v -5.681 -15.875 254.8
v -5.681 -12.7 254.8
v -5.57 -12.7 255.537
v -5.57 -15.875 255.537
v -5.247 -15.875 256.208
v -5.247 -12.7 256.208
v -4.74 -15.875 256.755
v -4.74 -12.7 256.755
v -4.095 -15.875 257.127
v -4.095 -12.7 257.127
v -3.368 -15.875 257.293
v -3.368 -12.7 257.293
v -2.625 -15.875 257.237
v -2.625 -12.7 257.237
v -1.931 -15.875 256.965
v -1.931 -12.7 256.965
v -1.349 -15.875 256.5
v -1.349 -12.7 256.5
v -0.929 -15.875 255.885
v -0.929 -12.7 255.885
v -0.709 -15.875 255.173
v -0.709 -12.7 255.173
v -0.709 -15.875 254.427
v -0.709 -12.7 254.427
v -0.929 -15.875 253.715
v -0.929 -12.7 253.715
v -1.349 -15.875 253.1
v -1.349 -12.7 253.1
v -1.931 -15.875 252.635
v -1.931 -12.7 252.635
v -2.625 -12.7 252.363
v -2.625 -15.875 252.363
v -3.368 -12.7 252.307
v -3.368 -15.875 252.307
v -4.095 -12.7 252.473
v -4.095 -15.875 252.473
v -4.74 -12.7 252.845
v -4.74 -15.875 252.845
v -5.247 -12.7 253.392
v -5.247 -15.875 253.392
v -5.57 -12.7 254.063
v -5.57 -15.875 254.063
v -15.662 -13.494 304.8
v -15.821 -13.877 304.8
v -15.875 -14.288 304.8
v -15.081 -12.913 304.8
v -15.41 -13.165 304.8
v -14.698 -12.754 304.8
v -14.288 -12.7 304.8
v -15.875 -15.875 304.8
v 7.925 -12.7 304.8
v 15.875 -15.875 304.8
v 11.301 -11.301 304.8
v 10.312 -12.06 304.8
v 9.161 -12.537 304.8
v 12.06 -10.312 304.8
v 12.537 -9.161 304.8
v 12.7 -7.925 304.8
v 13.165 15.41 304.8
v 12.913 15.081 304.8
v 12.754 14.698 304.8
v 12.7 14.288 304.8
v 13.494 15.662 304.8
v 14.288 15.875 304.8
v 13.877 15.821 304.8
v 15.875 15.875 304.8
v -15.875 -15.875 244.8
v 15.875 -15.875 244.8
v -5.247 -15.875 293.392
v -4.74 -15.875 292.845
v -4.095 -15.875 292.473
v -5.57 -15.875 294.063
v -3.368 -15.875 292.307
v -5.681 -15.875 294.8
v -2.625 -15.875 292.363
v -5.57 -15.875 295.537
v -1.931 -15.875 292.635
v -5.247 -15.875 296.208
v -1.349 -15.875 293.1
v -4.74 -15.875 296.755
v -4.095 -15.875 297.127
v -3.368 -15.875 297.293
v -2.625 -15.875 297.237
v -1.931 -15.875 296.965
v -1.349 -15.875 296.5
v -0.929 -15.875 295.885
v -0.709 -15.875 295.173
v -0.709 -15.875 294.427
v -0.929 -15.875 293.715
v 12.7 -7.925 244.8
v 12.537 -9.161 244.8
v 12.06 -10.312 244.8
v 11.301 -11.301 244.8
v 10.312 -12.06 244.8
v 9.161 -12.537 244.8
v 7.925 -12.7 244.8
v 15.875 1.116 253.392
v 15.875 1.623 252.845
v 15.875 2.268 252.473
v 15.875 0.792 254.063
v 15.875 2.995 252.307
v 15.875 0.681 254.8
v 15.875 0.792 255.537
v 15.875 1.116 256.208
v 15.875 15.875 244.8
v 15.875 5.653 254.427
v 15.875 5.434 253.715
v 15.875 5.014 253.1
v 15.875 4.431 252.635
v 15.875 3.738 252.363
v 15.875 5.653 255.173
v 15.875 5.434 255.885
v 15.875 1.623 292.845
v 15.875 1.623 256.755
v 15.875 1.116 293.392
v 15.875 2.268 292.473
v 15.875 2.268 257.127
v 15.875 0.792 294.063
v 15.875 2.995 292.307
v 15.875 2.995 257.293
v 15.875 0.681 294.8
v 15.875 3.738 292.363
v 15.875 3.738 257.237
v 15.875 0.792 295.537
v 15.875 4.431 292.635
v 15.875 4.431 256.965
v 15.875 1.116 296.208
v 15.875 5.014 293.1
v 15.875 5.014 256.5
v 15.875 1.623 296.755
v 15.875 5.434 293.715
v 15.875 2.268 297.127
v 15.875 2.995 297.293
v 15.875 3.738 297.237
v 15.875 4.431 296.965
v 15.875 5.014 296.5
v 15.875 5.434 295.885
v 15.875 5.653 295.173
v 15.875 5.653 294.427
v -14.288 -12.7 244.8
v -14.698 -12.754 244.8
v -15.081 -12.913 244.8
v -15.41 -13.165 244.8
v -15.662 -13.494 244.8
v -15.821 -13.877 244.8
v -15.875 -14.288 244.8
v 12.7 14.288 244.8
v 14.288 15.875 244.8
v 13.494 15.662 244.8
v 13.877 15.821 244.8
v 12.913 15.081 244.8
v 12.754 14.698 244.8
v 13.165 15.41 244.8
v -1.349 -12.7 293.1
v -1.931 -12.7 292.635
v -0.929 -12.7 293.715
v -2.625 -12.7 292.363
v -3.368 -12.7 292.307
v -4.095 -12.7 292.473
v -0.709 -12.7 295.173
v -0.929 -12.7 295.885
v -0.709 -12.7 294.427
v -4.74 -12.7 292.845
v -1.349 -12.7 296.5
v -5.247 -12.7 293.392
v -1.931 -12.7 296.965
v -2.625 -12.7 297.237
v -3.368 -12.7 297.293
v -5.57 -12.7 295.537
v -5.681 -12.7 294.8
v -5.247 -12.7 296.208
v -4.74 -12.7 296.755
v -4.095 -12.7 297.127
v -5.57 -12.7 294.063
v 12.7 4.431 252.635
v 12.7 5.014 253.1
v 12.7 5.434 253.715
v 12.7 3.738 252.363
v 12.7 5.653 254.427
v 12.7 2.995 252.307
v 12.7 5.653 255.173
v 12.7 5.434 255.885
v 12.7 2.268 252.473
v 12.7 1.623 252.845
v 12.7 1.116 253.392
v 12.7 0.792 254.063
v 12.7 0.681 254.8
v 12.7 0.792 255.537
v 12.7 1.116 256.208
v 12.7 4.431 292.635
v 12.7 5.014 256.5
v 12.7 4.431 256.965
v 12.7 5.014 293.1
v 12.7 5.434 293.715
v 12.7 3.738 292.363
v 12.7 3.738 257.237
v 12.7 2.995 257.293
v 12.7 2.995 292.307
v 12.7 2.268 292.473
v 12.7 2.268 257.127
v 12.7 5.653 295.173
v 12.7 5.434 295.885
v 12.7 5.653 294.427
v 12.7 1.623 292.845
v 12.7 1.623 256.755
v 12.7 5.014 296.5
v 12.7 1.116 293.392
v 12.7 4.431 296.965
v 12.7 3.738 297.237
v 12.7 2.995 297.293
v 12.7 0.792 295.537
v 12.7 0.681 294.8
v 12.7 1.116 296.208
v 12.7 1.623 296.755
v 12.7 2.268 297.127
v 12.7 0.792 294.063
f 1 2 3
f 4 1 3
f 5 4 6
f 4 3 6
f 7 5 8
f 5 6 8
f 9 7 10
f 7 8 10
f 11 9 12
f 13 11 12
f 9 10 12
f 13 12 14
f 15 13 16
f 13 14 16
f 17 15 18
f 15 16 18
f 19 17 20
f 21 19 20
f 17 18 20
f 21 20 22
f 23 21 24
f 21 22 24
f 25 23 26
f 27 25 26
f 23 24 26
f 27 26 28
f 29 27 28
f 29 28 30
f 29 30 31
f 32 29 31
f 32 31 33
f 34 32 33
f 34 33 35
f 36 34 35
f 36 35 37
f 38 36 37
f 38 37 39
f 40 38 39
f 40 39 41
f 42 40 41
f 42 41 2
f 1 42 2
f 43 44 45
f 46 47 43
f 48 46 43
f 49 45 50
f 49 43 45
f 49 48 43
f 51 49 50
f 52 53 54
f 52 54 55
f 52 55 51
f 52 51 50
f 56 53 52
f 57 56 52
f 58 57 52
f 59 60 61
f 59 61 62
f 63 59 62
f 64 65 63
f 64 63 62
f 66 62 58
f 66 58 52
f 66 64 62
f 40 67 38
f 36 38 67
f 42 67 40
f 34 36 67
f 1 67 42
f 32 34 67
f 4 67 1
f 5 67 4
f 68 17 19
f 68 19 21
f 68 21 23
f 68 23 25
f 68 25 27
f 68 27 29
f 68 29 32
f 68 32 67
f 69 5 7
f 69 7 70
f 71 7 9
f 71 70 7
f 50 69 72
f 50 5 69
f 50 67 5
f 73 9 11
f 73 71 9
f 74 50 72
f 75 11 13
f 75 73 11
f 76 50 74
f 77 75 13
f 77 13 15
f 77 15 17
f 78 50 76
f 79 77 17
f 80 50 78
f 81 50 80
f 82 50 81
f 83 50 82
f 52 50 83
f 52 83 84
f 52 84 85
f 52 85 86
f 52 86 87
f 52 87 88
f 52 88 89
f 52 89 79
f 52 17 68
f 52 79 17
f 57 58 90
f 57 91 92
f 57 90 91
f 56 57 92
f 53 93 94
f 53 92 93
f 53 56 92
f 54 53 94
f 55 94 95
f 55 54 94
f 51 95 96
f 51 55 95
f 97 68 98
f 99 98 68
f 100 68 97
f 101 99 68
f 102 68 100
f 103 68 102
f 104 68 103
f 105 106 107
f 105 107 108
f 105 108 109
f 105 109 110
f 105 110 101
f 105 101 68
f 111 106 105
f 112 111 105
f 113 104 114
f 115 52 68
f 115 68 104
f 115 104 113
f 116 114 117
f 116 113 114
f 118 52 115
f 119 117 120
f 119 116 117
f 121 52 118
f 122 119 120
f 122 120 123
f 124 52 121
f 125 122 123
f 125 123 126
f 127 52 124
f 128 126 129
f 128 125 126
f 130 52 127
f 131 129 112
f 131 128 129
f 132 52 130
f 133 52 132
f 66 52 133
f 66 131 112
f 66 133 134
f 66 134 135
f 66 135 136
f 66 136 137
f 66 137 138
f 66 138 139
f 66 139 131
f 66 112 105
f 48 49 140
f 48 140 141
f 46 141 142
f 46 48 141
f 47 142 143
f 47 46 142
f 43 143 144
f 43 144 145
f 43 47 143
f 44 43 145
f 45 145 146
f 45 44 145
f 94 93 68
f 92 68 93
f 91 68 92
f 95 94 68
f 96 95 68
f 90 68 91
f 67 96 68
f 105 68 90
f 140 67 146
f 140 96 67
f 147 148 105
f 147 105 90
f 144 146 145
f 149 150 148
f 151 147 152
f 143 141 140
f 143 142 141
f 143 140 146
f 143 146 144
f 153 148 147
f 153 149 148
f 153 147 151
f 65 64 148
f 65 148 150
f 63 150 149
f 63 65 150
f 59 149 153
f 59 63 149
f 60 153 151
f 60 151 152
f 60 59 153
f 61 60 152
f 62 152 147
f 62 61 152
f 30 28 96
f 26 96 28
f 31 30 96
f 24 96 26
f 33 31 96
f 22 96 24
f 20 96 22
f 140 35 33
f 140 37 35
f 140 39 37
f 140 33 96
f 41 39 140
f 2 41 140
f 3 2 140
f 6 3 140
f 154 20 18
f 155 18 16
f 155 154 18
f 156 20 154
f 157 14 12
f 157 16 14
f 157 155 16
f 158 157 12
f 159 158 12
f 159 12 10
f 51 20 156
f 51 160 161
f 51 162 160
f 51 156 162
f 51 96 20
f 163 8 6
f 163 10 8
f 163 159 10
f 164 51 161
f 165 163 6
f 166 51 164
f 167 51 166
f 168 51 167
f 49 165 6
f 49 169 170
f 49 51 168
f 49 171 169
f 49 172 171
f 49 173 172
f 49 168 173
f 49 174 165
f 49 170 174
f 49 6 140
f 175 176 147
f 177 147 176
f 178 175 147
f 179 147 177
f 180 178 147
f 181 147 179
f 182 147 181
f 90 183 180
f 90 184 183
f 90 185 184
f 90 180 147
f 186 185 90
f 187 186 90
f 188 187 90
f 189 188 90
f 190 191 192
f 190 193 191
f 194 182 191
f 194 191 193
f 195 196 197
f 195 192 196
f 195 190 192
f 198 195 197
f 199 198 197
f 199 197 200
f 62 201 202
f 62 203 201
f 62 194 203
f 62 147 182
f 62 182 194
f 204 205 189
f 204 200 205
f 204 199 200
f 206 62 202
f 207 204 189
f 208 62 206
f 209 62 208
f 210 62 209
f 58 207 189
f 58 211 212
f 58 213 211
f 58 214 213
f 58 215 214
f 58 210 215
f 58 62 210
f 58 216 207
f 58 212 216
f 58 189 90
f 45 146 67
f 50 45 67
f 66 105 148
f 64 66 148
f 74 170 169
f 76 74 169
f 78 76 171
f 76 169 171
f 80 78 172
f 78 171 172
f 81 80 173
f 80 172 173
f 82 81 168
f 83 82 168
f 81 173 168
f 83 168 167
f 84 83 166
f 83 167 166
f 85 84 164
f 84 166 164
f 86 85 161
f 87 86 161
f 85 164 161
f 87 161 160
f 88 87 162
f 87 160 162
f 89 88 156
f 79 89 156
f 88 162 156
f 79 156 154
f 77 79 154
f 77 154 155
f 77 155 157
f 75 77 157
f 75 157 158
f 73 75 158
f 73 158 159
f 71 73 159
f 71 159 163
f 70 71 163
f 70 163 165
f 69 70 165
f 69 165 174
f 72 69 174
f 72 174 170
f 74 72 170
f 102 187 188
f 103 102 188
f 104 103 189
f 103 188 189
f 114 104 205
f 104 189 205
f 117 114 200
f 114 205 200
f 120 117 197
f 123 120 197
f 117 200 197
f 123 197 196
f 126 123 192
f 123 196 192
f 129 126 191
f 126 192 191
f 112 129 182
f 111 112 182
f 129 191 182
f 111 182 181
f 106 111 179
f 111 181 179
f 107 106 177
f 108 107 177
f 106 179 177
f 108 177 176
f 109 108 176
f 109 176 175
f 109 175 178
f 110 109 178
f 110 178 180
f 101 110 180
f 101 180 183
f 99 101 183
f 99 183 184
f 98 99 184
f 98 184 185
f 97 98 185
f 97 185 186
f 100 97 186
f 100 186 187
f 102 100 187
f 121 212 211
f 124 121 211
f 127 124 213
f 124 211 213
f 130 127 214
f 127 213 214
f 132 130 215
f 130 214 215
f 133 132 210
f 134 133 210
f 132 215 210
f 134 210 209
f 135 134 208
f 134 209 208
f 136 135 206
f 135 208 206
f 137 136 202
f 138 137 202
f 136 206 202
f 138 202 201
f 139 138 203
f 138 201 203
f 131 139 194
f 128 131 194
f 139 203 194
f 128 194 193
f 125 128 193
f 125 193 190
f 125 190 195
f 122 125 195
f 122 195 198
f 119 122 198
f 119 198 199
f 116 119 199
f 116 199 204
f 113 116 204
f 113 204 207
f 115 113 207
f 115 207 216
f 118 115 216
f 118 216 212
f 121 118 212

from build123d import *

# Parameters (mm, degrees)
BOSS_EXTRUDE1_DEPTH = 304.8
SKETCH3_W           = 34.414454966
SKETCH3_H           = 33.657940314
CUT_EXTRUDE1_DEPTH  = 549.6
SKETCH5_R           = 2.5
CUT_EXTRUDE2_DEPTH  = 101.6
SKETCH4_R           = 2.5
CUT_EXTRUDE3_DEPTH  = 101.6


with BuildPart() as part:
    # Sketch2 → Boss-Extrude1 (new, symmetric)
    with BuildSketch(Plane.XY):
        with BuildLine():
            Line((-15.875, -15.875), (15.875, -15.875))
            Line((15.875, -15.875), (15.875, 15.875))
            Line((15.875, 15.875), (14.2875, 15.875))
            ThreePointArc((14.2875, 15.875), (13.164967985, 15.410032015), (12.7, 14.2875))
            Line((12.7, 14.2875), (12.7, -7.9248))
            ThreePointArc((12.7, -7.9248), (11.301376302, -11.301376302), (7.9248, -12.7))
            Line((7.9248, -12.7), (-14.2875, -12.7))
            ThreePointArc((-14.2875, -12.7), (-15.410032015, -13.164967985), (-15.875, -14.2875))
            Line((-15.875, -14.2875), (-15.875, -15.875))
        make_face()
    extrude(amount=BOSS_EXTRUDE1_DEPTH, both=True)

    # Sketch3 → Cut-Extrude1 (cut)
    with BuildSketch(Plane(origin=(0, 0, -304.8), x_dir=(-1, 0, 0), z_dir=(0, 0, -1))):
        with Locations((1.332227483, 0.953970157)):
            Rectangle(SKETCH3_W, SKETCH3_H)
    extrude(amount=-CUT_EXTRUDE1_DEPTH, mode=Mode.SUBTRACT)

    # Sketch5 → Cut-Extrude2 (cut)
    with BuildSketch(Plane.ZY.offset(-12.7)):
        with Locations(Location((294.8, 3.18135, 0), (0, 0, 270))):
            Circle(SKETCH5_R)
        with Locations(Location((254.8, 3.18135, 0), (0, 0, 270))):
            Circle(SKETCH5_R)
    extrude(amount=-CUT_EXTRUDE2_DEPTH, mode=Mode.SUBTRACT)

    # Sketch4 → Cut-Extrude3 (cut)
    with BuildSketch(Plane(origin=(0, -12.7, 0), x_dir=(1, 0, 0), z_dir=(0, 1, 0))):
        with Locations(Location((-3.18135, -254.8, 0), (0, 0, 180))):
            Circle(SKETCH4_R)
        with Locations(Location((-3.18135, -294.8, 0), (0, 0, 180))):
            Circle(SKETCH4_R)
    extrude(amount=-CUT_EXTRUDE3_DEPTH, mode=Mode.SUBTRACT)


solid = part.part
